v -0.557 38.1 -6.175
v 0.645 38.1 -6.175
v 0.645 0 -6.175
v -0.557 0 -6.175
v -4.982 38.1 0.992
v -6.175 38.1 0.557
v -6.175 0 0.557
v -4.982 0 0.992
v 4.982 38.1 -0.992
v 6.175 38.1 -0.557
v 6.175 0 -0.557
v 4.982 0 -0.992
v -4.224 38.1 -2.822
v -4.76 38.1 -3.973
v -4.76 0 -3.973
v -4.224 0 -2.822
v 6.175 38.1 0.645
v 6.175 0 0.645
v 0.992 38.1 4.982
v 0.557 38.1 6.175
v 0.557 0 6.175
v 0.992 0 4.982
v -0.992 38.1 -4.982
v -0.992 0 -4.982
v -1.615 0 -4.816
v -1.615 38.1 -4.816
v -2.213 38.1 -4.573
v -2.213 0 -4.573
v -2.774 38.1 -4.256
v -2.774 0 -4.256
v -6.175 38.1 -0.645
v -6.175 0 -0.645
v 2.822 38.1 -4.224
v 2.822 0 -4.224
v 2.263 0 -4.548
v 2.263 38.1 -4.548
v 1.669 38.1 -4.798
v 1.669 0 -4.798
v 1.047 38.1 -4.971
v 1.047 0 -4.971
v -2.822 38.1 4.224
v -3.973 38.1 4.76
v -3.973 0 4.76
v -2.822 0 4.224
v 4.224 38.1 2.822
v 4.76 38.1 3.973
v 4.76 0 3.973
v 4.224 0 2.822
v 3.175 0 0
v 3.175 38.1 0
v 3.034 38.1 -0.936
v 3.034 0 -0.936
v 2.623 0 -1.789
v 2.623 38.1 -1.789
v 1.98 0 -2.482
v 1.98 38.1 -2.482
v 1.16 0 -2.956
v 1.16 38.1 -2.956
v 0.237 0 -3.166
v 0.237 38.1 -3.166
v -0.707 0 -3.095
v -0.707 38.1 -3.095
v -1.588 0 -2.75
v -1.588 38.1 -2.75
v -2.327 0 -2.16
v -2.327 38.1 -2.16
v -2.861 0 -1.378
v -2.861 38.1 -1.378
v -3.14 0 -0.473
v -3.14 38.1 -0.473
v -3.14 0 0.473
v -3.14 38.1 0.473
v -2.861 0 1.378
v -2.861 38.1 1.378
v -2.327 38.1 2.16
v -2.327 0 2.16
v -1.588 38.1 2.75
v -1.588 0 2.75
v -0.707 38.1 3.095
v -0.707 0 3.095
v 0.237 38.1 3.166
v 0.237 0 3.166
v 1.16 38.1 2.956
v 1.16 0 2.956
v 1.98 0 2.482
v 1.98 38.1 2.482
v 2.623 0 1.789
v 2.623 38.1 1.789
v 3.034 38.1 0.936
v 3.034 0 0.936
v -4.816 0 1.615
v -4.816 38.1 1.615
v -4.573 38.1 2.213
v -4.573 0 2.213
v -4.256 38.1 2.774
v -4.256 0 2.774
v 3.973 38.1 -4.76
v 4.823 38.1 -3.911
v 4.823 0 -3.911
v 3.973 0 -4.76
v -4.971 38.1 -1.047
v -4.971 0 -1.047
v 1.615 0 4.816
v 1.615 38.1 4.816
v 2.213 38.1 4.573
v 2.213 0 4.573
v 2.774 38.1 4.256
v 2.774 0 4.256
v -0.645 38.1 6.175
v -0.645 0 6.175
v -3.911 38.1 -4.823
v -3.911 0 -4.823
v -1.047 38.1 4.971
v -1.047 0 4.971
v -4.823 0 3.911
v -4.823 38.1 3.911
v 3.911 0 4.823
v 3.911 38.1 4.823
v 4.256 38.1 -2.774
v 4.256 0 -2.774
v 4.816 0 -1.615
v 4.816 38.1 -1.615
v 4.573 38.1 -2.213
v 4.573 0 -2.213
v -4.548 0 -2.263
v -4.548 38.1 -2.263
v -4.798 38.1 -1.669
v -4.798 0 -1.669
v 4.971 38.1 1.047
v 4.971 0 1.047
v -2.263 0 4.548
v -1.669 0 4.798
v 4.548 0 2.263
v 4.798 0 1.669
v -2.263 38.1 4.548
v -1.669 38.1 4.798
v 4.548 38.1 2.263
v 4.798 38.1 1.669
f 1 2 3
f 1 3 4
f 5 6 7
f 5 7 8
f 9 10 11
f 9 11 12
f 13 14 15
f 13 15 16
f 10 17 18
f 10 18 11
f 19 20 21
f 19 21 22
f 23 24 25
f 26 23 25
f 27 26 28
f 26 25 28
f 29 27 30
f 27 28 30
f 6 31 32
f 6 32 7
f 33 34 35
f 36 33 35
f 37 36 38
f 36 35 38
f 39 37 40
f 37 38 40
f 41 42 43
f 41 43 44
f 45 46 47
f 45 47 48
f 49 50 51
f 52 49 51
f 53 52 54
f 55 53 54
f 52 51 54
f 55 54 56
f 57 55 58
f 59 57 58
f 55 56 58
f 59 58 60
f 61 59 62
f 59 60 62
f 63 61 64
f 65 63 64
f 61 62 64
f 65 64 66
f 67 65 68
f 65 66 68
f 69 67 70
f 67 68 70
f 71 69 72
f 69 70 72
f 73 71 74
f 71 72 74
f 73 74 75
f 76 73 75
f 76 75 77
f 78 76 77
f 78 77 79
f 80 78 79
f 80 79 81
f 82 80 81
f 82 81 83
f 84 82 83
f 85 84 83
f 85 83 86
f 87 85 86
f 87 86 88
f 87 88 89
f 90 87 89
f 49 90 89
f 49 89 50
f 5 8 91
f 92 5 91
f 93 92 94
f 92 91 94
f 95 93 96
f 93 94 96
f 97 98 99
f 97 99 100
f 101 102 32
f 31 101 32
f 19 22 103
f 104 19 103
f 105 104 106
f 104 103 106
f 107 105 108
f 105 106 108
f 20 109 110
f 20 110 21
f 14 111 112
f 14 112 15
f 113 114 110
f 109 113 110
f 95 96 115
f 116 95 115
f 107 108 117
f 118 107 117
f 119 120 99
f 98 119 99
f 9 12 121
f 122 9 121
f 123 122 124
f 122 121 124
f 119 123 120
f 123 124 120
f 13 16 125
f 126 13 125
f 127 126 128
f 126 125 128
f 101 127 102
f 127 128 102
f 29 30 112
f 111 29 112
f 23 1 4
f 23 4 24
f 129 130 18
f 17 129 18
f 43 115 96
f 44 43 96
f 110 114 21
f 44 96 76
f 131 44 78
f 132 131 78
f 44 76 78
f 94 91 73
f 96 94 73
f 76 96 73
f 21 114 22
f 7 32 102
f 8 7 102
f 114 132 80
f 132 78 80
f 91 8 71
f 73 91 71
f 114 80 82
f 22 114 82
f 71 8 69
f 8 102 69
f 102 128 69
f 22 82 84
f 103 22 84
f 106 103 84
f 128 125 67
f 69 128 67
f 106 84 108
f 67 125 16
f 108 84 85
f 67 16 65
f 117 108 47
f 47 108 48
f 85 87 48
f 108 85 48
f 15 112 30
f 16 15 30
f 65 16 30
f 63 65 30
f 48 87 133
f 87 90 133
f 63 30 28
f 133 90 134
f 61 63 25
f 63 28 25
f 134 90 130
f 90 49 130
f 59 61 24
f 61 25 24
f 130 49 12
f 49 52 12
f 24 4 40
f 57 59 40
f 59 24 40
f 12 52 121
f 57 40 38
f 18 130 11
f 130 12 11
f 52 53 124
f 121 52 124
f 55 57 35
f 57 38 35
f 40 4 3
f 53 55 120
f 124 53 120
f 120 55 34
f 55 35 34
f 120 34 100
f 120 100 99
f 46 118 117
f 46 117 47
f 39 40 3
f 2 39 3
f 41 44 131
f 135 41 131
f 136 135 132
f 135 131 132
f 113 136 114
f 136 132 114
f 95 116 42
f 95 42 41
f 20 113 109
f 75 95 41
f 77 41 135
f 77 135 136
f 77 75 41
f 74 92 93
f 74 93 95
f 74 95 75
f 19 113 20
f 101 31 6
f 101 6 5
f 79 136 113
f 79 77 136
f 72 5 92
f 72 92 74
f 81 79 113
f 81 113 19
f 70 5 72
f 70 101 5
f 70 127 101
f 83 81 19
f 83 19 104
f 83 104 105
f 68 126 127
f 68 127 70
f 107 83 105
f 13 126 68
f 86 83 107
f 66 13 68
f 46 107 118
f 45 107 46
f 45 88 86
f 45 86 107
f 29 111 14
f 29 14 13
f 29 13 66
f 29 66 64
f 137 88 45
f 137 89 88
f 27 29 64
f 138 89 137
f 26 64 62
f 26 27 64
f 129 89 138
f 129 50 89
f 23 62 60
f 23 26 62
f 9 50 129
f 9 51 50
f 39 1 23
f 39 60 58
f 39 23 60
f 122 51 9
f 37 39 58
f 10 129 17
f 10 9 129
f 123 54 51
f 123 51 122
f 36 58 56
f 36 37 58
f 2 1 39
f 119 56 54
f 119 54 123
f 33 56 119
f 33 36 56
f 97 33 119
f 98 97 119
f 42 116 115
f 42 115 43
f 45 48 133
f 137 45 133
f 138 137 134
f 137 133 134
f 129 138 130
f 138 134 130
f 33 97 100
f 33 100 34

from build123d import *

# Parameters (mm, degrees)
BOSS_EXTRUDE1_DEPTH = 38.1
SKETCH2_R           = 3.175
CUT_EXTRUDE1_DEPTH  = 39.1


with BuildPart() as part:
    # Sketch1 → Boss-Extrude1 (new body)
    with BuildSketch(Plane(origin=(0, 0, 0), x_dir=(1, 0, 0), z_dir=(0, 1, 0))):
        with BuildLine():
            Line((1.047492977, 4.970830762), (0.644904142, 6.175331583))
            Line((0.644904142, 6.175331583), (-0.556834652, 6.175331583))
            Line((-0.556834652, 6.175331583), (-0.991979734, 4.982205958))
            ThreePointArc((-0.991979734, 4.982205958), (-1.917824995, 4.70407773), (-2.774218752, 4.255597527))
            Line((-2.774218752, 4.255597527), (-3.910602747, 4.822634931))
            Line((-3.910602747, 4.822634931), (-4.760360397, 3.97287728))
            Line((-4.760360397, 3.97287728), (-4.224387215, 2.821516022))
            ThreePointArc((-4.224387215, 2.821516022), (-4.682392321, 1.970178203), (-4.970830762, 1.047492977))
            Line((-4.970830762, 1.047492977), (-6.175331583, 0.644904142))
            Line((-6.175331583, 0.644904142), (-6.175331583, -0.556834652))
            Line((-6.175331583, -0.556834652), (-4.982205958, -0.991979734))
            ThreePointArc((-4.982205958, -0.991979734), (-4.70407773, -1.917824995), (-4.255597527, -2.774218752))
            Line((-4.255597527, -2.774218752), (-4.822634931, -3.910602747))
            Line((-4.822634931, -3.910602747), (-3.97287728, -4.760360397))
            Line((-3.97287728, -4.760360397), (-2.821516022, -4.224387215))
            ThreePointArc((-2.821516022, -4.224387215), (-1.970178203, -4.682392321), (-1.047492977, -4.970830762))
            Line((-1.047492977, -4.970830762), (-0.644904142, -6.175331583))
            Line((-0.644904142, -6.175331583), (0.556834652, -6.175331583))
            Line((0.556834652, -6.175331583), (0.991979734, -4.982205958))
            ThreePointArc((0.991979734, -4.982205958), (1.917824995, -4.70407773), (2.774218752, -4.255597527))
            Line((2.774218752, -4.255597527), (3.910602747, -4.822634931))
            Line((3.910602747, -4.822634931), (4.760360397, -3.97287728))
            Line((4.760360397, -3.97287728), (4.224387215, -2.821516022))
            ThreePointArc((4.224387215, -2.821516022), (4.682392321, -1.970178203), (4.970830762, -1.047492977))
            Line((4.970830762, -1.047492977), (6.175331583, -0.644904142))
            Line((6.175331583, -0.644904142), (6.175331583, 0.556834652))
            Line((6.175331583, 0.556834652), (4.982205958, 0.991979734))
            ThreePointArc((4.982205958, 0.991979734), (4.70407773, 1.917824995), (4.255597527, 2.774218752))
            Line((4.255597527, 2.774218752), (4.822634931, 3.910602747))
            Line((4.822634931, 3.910602747), (3.97287728, 4.760360397))
            Line((3.97287728, 4.760360397), (2.821516022, 4.224387215))
            ThreePointArc((2.821516022, 4.224387215), (1.970178203, 4.682392321), (1.047492977, 4.970830762))
        make_face()
    extrude(amount=BOSS_EXTRUDE1_DEPTH)

    # Sketch2 → Cut-Extrude1 (cut, through all)
    with BuildSketch(Plane(origin=(0, 38.1, 0), x_dir=(1, 0, 0), z_dir=(0, 1, 0))):
        Circle(SKETCH2_R)
    extrude(amount=-CUT_EXTRUDE1_DEPTH, mode=Mode.SUBTRACT)


solid = part.part
